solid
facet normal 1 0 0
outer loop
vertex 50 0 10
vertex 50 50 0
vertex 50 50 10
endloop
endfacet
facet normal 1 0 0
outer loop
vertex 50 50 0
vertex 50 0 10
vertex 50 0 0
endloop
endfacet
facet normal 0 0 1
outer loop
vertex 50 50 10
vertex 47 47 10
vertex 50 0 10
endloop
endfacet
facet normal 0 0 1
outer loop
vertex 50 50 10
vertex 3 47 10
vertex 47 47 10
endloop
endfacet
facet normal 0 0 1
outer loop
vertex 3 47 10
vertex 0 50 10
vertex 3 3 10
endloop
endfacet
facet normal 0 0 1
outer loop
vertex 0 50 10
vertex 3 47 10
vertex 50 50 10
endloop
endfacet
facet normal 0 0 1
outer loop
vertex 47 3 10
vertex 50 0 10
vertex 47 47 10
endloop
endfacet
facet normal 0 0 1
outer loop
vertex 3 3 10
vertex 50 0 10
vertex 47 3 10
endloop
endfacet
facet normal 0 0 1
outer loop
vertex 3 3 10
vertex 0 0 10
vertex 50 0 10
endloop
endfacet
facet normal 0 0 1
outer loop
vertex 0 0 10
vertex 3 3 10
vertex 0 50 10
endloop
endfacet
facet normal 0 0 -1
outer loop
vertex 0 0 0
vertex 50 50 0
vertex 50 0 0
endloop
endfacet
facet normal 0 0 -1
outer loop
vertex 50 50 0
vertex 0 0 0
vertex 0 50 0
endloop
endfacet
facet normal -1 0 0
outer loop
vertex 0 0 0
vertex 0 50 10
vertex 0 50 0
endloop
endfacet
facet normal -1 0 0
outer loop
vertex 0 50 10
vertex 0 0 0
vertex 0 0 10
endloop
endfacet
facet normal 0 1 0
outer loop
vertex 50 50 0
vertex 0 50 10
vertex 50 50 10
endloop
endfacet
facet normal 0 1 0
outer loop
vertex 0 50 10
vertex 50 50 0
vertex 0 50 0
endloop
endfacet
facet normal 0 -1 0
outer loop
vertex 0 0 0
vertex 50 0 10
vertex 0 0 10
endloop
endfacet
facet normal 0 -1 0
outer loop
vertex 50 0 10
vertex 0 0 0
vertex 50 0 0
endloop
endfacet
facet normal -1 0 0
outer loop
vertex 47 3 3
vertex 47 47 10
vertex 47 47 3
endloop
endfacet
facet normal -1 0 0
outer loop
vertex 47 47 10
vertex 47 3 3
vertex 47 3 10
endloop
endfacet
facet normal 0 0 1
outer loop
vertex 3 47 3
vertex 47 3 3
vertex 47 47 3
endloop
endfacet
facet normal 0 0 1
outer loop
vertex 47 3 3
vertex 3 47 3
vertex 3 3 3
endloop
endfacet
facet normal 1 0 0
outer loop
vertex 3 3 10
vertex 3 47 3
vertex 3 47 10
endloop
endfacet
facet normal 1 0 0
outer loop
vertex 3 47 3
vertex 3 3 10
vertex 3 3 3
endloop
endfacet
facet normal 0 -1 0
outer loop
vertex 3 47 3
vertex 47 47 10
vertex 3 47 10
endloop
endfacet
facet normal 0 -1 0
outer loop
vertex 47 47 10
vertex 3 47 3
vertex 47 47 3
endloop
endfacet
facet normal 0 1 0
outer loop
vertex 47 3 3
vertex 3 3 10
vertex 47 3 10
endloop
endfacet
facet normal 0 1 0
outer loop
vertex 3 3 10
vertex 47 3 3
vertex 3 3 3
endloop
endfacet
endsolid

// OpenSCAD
// Generated by HEIDI for job job_1787696801663_e6e13005
// Product: 3D-Printable Model Preparation Package
// Request: dual path test
// Model type: box
// Generated: 2026-09-07T04:35:14.515Z
//
// This is a parameterized OpenSCAD model. You can adjust the
// parameters below to customize the dimensions before rendering.

// ─── Parameters ───
width = 50;       // X dimension in mm
height = 50;     // Y dimension in mm
depth = 10;       // Z dimension in mm
wall = 3;    // wall thickness in mm
$fn = 60;               // facet resolution

// Parametric hollow box
module parametric_box() {
    difference() {
        // Outer shell
        cube([width, height, depth]);
        // Inner cavity
        translate([wall, wall, wall])
            cube([width - wall * 2, height - wall * 2, depth - wall + 1]);
    }
}
parametric_box();
